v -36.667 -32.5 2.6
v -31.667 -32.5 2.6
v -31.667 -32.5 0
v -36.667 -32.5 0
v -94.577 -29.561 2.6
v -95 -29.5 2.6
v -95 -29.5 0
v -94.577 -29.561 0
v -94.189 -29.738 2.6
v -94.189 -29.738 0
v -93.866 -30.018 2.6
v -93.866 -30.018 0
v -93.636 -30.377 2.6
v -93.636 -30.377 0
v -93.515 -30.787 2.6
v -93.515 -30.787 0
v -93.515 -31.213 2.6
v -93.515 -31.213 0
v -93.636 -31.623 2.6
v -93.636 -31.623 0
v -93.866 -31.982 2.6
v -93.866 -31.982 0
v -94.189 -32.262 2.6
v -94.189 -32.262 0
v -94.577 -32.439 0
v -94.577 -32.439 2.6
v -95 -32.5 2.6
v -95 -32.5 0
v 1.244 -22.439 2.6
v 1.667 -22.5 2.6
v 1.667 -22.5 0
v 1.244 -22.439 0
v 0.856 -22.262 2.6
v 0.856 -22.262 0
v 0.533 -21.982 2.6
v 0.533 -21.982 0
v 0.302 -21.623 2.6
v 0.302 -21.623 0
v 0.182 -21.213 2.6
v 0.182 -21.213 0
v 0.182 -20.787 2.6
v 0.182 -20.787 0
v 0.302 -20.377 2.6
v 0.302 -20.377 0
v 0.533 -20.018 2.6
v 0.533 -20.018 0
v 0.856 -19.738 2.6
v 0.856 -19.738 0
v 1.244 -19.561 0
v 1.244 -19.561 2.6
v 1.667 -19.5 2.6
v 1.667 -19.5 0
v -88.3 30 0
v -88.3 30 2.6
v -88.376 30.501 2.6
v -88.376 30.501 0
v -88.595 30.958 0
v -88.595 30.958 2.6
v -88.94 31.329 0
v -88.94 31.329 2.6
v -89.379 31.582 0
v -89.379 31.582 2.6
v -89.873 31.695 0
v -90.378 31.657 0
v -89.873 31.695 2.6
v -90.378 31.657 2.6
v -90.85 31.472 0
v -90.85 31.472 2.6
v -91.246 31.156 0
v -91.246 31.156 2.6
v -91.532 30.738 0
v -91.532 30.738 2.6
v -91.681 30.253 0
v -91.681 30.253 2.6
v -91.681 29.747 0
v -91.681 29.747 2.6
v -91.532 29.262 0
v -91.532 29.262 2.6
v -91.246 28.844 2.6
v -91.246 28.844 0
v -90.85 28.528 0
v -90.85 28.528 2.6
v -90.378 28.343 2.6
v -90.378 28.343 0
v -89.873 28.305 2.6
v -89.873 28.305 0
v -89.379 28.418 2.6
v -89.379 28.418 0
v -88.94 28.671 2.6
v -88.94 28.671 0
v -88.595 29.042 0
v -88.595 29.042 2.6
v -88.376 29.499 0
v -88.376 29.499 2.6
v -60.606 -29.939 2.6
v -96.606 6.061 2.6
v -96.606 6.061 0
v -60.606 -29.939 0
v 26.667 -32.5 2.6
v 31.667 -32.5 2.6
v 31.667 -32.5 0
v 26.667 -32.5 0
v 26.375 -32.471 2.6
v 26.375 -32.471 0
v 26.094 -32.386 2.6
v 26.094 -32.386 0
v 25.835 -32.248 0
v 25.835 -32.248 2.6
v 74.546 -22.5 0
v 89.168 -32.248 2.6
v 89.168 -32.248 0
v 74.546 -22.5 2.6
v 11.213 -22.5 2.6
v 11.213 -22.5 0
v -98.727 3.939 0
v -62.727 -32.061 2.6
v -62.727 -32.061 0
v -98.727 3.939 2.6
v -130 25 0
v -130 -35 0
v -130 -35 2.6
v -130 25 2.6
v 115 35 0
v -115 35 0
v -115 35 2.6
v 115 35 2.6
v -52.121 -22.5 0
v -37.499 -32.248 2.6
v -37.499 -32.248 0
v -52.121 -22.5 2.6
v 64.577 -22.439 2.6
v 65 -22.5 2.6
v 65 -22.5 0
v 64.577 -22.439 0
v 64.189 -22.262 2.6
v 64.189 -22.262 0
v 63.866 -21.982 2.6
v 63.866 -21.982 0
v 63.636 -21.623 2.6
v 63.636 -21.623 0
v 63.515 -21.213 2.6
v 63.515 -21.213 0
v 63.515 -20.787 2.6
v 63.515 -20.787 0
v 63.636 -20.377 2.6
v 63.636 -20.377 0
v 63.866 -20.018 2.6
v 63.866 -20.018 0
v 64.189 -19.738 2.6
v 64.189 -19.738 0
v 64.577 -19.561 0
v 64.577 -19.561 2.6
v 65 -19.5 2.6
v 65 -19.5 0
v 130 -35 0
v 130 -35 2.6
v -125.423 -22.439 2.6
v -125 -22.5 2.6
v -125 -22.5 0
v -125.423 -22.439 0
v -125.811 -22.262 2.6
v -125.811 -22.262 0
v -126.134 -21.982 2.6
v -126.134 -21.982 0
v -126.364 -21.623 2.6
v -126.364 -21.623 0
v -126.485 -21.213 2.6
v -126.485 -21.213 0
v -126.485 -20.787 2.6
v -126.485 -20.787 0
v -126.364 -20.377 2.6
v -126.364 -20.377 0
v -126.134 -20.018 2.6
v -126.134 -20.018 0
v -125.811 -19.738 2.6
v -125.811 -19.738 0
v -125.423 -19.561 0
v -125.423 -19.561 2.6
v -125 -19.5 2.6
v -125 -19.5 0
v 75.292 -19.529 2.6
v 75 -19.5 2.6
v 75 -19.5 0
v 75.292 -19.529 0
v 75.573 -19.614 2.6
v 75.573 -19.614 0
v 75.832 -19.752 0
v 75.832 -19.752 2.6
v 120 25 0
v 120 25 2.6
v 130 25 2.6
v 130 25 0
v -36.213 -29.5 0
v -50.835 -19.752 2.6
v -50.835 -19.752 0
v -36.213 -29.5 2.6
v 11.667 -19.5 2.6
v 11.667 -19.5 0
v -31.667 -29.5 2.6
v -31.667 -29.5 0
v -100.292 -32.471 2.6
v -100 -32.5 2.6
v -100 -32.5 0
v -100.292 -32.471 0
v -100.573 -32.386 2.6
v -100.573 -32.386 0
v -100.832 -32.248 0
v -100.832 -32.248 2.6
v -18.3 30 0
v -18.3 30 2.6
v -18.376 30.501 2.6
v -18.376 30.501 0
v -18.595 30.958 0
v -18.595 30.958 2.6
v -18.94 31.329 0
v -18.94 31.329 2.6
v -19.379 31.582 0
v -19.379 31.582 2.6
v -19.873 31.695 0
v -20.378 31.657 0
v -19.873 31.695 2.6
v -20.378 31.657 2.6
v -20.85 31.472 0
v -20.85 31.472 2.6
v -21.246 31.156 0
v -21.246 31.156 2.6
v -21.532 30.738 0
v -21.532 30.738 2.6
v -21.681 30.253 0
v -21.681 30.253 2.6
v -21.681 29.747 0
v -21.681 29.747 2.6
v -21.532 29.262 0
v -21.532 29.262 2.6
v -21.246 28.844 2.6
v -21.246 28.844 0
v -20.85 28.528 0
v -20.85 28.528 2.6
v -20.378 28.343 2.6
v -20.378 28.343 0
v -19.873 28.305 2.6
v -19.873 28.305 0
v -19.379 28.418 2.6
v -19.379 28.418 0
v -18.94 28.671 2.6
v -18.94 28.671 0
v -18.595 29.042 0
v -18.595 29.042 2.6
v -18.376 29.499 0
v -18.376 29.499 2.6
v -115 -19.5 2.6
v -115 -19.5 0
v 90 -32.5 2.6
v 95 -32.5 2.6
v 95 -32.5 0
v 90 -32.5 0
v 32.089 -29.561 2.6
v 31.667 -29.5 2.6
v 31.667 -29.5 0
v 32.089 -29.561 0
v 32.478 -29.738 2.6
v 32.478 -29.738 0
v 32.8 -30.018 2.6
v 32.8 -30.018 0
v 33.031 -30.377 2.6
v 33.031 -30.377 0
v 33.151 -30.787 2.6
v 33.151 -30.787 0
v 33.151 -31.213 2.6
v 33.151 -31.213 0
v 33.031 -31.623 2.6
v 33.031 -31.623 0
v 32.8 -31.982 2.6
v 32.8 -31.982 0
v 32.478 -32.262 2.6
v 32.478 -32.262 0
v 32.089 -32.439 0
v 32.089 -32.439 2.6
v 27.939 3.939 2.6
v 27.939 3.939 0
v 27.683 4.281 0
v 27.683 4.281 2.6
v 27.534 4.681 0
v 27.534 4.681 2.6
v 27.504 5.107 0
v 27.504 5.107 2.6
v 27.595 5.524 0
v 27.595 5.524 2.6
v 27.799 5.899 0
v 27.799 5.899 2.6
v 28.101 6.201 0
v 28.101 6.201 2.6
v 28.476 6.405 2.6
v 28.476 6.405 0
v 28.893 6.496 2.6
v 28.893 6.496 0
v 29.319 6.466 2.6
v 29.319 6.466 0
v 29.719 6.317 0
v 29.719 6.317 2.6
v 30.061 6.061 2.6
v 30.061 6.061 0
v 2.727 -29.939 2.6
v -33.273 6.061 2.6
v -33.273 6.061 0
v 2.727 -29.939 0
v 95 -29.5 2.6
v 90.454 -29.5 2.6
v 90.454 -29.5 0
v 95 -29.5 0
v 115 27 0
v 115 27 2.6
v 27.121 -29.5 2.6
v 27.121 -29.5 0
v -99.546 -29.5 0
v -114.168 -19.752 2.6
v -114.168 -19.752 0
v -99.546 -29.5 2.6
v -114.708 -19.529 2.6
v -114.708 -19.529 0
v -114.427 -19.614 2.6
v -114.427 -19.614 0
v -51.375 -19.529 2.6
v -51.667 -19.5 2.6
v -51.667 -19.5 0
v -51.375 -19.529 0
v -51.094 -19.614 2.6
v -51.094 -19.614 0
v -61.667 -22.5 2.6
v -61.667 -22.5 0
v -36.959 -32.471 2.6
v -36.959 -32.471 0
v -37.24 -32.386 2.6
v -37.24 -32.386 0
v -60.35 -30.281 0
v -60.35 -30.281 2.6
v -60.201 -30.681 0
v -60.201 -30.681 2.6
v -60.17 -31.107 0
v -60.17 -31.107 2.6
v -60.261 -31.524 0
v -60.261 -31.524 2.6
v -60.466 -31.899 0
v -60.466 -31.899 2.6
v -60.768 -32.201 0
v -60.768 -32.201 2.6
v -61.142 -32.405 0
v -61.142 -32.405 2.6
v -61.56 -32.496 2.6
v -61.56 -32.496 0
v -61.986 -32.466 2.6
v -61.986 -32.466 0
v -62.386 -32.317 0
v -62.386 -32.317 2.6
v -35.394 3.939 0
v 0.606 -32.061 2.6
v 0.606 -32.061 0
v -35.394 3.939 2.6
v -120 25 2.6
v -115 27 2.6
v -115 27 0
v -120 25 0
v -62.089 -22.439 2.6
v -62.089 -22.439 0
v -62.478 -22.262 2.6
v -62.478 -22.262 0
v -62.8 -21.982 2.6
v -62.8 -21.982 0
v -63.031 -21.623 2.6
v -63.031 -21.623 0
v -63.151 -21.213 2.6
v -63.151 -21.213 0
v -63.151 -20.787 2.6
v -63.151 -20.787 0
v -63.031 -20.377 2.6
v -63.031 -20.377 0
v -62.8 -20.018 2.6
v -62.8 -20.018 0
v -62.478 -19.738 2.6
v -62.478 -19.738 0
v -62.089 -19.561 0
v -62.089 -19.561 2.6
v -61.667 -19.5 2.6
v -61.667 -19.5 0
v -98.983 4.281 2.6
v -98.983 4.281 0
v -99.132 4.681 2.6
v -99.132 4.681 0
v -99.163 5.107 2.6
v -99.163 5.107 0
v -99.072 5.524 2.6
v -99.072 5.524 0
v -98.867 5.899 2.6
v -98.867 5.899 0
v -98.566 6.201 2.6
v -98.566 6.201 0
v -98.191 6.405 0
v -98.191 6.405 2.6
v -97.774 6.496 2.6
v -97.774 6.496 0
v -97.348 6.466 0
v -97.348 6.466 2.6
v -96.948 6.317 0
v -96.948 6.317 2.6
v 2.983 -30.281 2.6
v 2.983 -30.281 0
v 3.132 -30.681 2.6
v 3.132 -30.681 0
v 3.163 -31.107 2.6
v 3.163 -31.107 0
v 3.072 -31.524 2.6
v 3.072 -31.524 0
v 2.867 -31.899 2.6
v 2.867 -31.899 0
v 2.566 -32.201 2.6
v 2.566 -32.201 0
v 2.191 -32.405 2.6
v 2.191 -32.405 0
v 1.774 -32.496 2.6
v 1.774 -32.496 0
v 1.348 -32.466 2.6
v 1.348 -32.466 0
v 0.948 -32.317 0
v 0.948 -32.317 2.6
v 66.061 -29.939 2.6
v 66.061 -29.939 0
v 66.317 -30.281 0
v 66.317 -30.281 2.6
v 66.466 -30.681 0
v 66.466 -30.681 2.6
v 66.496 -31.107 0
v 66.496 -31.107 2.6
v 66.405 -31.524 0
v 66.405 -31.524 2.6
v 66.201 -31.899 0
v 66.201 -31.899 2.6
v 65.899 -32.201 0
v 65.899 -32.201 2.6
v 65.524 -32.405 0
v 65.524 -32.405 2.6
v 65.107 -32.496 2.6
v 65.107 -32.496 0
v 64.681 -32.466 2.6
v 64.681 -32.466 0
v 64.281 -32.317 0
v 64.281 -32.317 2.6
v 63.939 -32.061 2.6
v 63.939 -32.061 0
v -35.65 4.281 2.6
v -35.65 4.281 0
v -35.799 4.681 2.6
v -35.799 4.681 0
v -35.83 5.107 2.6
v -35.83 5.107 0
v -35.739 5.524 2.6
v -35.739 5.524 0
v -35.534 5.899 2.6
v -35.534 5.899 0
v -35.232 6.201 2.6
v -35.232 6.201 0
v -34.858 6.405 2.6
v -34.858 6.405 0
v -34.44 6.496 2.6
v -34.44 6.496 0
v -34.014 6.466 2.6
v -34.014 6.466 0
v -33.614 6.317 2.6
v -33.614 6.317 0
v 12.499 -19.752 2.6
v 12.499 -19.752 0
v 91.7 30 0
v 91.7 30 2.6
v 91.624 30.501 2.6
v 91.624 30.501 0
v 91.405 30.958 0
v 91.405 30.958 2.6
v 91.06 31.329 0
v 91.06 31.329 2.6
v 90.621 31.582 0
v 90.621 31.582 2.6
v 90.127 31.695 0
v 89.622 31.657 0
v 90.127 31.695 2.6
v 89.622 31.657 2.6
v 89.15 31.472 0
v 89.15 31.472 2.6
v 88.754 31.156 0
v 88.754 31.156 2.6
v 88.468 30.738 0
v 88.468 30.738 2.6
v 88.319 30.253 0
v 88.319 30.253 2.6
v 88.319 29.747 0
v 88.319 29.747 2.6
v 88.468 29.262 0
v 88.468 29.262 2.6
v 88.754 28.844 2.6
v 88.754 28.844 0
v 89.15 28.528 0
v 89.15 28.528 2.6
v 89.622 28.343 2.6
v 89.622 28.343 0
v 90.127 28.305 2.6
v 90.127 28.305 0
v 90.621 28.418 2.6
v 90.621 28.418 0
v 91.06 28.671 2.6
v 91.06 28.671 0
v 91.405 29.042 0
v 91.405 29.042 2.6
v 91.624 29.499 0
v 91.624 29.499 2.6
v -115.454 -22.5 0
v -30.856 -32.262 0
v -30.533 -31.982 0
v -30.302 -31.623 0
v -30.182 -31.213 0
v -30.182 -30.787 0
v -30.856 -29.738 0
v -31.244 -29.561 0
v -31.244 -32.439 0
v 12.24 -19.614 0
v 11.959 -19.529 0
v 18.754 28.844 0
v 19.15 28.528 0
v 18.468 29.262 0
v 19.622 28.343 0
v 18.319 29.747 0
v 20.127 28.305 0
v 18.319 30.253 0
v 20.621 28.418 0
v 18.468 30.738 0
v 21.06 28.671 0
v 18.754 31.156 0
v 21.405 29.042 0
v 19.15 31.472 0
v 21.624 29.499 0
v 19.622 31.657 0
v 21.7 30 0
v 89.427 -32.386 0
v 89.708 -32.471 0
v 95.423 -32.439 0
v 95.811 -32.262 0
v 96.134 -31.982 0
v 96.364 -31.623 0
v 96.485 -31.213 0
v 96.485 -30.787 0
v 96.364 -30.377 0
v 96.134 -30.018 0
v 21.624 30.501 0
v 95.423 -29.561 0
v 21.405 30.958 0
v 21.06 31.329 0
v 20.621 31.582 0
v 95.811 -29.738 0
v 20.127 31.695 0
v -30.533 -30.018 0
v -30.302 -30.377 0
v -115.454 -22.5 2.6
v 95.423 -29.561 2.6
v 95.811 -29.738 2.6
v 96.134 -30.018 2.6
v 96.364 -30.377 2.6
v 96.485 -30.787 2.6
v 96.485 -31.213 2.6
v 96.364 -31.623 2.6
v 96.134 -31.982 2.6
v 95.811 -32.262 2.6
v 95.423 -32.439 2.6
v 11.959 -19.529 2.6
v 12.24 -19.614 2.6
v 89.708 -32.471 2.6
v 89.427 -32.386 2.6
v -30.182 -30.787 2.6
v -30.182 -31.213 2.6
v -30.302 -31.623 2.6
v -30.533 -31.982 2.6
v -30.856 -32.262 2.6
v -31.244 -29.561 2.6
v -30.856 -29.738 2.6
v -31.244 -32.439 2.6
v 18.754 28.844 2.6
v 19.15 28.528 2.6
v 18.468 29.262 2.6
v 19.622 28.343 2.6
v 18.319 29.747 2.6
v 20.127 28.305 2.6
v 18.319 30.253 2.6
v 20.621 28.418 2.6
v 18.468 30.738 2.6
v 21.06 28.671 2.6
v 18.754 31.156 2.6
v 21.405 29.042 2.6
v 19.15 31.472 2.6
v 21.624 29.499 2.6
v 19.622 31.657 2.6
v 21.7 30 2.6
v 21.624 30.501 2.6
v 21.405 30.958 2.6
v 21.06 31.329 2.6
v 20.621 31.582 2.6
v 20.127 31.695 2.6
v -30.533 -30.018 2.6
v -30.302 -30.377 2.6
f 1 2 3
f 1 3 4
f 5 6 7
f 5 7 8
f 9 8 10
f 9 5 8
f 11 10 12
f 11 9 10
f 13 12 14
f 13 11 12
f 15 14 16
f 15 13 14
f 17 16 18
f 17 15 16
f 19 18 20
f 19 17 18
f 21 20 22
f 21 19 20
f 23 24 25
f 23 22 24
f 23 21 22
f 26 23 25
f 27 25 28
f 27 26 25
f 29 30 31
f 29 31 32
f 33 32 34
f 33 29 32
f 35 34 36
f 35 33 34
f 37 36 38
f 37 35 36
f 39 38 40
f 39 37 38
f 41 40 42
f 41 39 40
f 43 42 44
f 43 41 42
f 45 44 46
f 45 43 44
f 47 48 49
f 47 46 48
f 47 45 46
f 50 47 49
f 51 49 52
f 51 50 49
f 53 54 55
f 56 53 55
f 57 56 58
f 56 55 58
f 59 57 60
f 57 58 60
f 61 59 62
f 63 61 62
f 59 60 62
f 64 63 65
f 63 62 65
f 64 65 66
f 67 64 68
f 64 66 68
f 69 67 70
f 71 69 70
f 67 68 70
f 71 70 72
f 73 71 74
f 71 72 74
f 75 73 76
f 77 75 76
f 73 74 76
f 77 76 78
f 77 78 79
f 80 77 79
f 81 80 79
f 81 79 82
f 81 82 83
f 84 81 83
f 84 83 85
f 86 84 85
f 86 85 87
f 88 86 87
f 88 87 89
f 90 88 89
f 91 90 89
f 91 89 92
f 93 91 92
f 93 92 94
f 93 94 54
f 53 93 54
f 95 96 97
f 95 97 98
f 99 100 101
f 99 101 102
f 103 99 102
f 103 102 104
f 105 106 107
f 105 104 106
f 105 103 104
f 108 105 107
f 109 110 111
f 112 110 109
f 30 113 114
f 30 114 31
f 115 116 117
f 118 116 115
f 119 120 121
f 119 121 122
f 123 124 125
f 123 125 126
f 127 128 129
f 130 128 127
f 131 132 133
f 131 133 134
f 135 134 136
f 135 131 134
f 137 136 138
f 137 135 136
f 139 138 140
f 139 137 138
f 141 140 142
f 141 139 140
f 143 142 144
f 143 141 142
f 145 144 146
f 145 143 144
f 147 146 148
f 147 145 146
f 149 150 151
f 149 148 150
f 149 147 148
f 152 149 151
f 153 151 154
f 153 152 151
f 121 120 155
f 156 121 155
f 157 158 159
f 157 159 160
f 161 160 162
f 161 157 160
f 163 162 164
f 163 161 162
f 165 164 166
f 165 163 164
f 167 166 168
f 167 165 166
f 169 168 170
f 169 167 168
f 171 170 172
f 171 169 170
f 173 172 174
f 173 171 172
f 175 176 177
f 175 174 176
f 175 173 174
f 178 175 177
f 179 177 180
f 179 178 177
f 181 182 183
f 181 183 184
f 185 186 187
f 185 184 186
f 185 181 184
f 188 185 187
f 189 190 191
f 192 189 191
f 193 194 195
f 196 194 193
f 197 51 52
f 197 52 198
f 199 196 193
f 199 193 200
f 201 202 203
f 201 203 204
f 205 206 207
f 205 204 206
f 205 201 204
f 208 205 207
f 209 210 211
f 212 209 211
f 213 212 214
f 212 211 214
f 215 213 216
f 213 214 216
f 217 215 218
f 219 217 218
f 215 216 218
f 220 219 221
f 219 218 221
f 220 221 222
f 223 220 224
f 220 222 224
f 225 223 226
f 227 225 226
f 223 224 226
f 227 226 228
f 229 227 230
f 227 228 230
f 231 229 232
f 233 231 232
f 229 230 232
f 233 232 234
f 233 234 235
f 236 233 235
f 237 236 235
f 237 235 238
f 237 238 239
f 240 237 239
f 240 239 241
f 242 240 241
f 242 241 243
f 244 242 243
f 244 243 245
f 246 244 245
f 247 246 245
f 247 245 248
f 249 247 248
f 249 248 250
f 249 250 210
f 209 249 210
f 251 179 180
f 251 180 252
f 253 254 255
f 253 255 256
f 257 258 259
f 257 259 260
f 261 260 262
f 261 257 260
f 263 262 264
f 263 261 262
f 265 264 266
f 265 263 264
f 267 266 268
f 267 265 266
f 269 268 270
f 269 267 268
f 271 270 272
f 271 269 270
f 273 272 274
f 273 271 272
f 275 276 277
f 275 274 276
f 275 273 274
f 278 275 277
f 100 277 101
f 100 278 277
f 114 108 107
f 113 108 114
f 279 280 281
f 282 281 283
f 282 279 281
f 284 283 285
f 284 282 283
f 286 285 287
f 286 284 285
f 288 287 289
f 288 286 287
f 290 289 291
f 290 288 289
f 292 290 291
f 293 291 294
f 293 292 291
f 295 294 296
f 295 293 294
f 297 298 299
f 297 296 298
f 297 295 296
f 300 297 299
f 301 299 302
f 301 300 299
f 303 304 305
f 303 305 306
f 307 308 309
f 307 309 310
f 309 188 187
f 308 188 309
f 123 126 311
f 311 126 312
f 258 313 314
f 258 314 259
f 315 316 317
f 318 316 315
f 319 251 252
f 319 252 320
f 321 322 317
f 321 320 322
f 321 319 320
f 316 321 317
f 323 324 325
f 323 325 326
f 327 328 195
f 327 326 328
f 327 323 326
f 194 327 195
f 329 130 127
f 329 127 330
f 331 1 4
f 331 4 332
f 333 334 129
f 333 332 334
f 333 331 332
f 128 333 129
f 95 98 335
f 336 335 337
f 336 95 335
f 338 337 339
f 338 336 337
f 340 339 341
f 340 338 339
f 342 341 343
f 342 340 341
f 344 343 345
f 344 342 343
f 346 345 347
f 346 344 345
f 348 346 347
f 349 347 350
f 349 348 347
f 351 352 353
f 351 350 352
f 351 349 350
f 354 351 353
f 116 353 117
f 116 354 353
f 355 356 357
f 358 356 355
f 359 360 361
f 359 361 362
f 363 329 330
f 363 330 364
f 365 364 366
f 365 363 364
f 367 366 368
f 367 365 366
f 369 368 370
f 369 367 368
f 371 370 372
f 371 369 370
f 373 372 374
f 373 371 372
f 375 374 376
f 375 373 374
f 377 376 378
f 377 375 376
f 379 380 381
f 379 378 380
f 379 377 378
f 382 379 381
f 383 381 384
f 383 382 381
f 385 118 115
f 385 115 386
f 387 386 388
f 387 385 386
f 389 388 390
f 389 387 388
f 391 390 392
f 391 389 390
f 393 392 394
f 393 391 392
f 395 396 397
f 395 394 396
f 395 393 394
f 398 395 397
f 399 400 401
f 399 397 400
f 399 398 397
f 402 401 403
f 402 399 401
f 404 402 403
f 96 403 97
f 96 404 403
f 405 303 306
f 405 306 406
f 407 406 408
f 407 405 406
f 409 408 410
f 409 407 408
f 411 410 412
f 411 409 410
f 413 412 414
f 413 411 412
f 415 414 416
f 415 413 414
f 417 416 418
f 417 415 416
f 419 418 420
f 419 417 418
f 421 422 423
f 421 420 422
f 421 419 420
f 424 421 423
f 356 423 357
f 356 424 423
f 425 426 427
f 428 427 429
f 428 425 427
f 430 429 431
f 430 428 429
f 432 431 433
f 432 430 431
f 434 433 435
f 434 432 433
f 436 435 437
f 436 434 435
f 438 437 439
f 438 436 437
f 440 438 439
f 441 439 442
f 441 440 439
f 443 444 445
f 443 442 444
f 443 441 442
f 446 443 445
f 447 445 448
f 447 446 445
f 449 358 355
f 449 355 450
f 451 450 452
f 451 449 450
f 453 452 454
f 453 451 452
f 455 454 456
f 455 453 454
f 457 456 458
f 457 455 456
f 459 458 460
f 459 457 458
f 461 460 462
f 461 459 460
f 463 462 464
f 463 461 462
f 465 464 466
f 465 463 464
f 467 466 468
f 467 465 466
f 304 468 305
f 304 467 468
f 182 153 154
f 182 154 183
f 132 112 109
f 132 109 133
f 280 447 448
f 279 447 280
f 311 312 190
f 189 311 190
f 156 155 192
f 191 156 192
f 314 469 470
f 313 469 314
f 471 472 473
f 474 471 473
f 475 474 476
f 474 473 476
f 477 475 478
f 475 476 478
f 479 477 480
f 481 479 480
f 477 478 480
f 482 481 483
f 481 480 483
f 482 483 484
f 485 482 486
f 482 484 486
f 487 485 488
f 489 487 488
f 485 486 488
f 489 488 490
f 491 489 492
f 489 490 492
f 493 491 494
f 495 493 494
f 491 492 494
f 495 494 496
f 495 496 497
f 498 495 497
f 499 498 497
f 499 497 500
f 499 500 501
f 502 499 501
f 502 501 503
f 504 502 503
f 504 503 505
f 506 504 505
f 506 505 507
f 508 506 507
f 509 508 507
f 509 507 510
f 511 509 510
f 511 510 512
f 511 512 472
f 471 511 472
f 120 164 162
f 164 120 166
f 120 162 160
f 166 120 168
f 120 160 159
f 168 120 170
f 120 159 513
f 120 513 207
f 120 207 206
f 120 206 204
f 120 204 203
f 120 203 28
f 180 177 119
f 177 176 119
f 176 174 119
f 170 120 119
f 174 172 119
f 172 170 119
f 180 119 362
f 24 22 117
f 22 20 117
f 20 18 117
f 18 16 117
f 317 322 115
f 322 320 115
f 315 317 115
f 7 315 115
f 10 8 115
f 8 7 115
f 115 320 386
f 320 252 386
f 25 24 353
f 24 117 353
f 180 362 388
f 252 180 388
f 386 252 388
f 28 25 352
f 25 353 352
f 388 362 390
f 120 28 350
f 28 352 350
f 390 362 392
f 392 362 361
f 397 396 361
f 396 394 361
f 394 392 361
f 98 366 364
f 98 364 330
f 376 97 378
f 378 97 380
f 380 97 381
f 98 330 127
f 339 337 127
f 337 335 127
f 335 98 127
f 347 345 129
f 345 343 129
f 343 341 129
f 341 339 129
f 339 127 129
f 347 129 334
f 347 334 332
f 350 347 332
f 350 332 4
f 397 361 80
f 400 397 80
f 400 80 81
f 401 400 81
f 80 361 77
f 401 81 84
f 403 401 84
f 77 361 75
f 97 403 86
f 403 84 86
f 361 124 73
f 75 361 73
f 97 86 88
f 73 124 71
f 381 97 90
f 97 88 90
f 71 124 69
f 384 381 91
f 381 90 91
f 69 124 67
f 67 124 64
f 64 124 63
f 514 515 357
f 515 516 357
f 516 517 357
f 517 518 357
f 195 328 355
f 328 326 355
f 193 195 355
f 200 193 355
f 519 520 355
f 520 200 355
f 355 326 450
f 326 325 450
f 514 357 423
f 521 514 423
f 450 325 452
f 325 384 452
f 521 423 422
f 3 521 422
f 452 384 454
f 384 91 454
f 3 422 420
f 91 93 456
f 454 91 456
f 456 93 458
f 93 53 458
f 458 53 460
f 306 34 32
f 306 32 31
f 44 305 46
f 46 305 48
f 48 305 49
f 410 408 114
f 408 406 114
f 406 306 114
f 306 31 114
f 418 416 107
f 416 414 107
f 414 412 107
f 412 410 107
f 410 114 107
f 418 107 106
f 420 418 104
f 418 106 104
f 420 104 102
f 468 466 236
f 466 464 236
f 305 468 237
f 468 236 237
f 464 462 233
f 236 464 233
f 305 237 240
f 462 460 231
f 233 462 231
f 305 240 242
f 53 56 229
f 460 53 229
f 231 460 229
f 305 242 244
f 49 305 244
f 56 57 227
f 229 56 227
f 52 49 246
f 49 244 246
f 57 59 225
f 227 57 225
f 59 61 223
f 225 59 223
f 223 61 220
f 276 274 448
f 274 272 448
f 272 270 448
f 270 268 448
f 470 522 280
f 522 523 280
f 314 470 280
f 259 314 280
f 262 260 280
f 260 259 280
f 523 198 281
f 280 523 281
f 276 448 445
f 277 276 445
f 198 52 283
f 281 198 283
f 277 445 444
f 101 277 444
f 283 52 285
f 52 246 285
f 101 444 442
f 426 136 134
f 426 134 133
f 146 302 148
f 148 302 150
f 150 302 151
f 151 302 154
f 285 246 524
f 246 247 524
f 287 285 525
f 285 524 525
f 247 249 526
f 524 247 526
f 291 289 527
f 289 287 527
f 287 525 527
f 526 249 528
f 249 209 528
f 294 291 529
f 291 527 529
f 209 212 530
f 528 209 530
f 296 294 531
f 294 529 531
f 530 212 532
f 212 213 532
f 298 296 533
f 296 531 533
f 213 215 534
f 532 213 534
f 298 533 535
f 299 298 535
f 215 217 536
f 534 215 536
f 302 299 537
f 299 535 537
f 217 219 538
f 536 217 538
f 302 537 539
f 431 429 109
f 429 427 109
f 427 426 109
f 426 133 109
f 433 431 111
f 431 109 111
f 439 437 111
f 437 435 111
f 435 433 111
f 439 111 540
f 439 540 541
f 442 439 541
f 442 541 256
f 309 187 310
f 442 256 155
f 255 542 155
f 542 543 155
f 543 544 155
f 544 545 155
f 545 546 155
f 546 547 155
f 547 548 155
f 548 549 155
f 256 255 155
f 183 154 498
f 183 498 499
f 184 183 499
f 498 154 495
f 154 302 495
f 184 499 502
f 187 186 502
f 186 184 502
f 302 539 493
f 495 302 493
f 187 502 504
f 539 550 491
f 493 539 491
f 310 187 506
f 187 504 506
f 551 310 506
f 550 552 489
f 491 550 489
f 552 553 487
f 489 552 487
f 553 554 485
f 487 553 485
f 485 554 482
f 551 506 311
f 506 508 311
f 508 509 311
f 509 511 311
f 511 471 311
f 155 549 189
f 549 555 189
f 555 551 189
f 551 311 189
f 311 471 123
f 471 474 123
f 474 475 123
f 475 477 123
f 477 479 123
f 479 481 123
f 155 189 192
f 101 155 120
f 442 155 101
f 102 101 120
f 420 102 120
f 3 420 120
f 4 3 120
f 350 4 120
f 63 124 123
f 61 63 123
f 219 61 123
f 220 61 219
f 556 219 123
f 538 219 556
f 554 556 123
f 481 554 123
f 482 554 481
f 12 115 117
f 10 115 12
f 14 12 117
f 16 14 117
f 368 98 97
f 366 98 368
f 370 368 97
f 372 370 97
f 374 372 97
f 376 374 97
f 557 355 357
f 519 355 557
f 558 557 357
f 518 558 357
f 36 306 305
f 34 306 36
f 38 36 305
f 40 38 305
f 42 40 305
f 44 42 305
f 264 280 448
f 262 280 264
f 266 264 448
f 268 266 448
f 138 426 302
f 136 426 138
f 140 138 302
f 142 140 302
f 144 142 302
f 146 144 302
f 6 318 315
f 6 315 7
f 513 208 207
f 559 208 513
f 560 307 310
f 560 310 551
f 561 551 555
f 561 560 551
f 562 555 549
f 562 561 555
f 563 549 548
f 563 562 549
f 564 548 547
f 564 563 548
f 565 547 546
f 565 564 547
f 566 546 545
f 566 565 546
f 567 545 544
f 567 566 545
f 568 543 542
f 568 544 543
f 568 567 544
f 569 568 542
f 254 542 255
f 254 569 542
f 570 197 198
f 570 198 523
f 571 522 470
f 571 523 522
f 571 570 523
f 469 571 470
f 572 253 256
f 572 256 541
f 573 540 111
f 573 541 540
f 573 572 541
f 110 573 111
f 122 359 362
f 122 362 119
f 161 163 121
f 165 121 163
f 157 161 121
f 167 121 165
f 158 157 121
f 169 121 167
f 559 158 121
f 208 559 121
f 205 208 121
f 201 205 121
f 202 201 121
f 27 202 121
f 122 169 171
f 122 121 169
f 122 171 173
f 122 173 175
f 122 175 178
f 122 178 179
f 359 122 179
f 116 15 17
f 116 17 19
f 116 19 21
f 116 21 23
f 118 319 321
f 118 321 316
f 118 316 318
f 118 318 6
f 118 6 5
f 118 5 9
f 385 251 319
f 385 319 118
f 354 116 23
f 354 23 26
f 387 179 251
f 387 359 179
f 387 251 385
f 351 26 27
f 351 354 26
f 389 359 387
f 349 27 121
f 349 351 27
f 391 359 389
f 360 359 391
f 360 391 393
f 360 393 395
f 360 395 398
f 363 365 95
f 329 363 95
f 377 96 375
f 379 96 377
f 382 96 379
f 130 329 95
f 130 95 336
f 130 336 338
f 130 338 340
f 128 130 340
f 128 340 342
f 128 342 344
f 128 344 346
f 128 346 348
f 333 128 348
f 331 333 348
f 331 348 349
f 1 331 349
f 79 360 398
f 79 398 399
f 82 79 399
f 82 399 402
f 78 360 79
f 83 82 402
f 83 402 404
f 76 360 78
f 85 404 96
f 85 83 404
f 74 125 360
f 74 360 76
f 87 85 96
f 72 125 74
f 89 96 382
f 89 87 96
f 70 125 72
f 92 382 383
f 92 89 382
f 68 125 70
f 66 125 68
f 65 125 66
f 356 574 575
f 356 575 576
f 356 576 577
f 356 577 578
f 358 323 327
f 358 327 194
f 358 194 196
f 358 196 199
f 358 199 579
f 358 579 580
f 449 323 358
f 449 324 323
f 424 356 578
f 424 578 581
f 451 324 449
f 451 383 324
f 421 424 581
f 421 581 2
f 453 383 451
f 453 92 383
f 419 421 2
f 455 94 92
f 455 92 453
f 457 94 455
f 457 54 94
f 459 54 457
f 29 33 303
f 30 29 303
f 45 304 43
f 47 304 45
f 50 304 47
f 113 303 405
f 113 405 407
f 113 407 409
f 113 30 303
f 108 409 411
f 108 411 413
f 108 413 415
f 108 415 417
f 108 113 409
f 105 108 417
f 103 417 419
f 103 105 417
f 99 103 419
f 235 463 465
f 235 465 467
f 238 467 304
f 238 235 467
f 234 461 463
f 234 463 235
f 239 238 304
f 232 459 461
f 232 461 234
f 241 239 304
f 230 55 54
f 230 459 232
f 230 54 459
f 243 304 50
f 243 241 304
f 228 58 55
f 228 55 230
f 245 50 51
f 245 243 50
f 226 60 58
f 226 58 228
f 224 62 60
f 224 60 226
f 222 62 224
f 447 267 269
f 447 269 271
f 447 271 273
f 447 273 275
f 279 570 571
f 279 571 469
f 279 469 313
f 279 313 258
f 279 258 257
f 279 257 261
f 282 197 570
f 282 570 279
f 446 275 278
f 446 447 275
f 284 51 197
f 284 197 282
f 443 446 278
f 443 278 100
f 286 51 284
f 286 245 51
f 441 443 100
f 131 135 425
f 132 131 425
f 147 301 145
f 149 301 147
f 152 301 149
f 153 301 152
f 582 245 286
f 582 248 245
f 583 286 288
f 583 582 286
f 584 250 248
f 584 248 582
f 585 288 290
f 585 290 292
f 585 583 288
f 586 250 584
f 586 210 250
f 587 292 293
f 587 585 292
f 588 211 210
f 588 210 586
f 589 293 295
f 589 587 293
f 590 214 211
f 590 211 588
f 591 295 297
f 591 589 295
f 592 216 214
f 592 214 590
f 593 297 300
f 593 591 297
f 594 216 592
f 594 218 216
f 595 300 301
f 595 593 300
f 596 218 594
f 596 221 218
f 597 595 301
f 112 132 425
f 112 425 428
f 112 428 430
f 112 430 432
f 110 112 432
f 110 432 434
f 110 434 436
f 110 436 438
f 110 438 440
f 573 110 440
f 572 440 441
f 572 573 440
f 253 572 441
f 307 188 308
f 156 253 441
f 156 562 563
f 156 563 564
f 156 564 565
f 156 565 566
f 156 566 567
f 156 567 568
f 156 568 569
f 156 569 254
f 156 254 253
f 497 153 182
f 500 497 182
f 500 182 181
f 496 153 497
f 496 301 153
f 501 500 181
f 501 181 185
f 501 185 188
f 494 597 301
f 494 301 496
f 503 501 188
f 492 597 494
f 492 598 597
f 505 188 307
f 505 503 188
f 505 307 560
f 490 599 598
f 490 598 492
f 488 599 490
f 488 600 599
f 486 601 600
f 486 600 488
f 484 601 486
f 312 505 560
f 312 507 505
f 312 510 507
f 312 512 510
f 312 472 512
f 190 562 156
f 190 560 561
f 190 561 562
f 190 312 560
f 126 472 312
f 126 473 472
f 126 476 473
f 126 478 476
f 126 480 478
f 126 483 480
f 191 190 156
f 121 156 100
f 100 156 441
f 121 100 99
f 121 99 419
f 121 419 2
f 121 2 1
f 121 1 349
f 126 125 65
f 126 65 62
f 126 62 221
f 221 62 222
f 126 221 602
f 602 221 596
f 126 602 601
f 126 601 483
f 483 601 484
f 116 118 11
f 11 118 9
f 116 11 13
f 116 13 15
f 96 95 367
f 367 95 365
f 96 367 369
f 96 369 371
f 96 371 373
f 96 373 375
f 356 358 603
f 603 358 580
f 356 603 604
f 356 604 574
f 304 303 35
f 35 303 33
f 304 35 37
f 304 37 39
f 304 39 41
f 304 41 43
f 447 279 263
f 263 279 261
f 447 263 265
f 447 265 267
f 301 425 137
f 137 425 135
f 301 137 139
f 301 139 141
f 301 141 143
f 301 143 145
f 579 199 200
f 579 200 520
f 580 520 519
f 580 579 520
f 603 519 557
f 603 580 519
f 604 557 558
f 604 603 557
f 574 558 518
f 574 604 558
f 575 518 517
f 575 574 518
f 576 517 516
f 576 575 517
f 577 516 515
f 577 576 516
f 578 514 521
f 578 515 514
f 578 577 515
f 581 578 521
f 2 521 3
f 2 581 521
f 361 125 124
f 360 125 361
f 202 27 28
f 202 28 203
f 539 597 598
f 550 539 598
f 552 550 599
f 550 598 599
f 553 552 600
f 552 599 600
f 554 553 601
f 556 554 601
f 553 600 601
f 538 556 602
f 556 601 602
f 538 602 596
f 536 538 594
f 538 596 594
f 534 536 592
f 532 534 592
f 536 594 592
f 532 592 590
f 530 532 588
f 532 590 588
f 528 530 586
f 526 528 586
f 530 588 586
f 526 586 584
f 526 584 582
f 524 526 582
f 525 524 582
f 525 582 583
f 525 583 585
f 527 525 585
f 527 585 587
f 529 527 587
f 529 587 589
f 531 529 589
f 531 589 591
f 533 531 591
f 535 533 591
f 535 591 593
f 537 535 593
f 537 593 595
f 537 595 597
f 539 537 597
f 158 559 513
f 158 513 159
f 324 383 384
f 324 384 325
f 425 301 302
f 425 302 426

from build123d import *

# Parameters (mm, degrees)
SKETCH_1_W             = 260
SKETCH_1_H             = 70
EXTRUDE_1_DEPTH        = 2.6
SKETCH_2_R             = 1.7
CUT_EXTRUDE_1_DEPTH    = 135.654223848
SKETCH_3_R             = 1.3
CUT_EXTRUDE_2_DEPTH    = 135.654223848
CUT_EXTRUDE_4_DEPTH    = 135.654223848
PATTERN_LINEAR_2_COUNT = 3
PATTERN_LINEAR_2_PITCH = 63.333333333
CUT_EXTRUDE_3_DEPTH    = 135.654223848
PATTERN_LINEAR_1_COUNT = 4
PATTERN_LINEAR_1_PITCH = 63.333333333


with BuildPart() as part:
    # 草图1 → 凸台-拉伸1 (new body)
    with BuildSketch(Plane.XY):
        Rectangle(SKETCH_1_W, SKETCH_1_H)
    extrude(amount=EXTRUDE_1_DEPTH)

    # 草图2 → 切除-拉伸1 (cut, through all)
    with BuildSketch(Plane.XY.offset(2.6)):
        with Locations((-90, 30)):
            Circle(SKETCH_2_R)
        with Locations((-20, 30)):
            Circle(SKETCH_2_R)
        with Locations((20, 30)):
            Circle(SKETCH_2_R)
        with Locations((90, 30)):
            Circle(SKETCH_2_R)
        Polygon((-130, 25), (-130, 35), (-115, 35), (-115, 27), (-120, 25), align=None)
        Polygon((130, 25), (130, 35), (115, 35), (115, 27), (120, 25), align=None)
    extrude(amount=-CUT_EXTRUDE_1_DEPTH, mode=Mode.SUBTRACT)

    # 草图3 → 切除-拉伸2 (cut, through all)
    with BuildSketch(Plane.XY.offset(2.6)):
        with Locations((-61.666666667, -31)):
            Circle(SKETCH_3_R)
        with Locations((1.666666667, -31)):
            Circle(SKETCH_3_R)
        with Locations((65, -31)):
            Circle(SKETCH_3_R)
    extrude(amount=-CUT_EXTRUDE_2_DEPTH, mode=Mode.SUBTRACT)

    # 草图5 → 切除-拉伸4 (cut, through all)
    with BuildSketch(Plane.XY.offset(2.6)):
        with BuildLine():
            Line((-62.727326838, -32.060660172), (-98.727326838, 3.939339828))
            ThreePointArc((-98.727326838, 3.939339828), (-98.727326838, 6.060660172), (-96.606006495, 6.060660172))
            Line((-96.606006495, 6.060660172), (-60.606006495, -29.939339828))
            ThreePointArc((-60.606006495, -29.939339828), (-60.606006495, -32.060660172), (-62.727326838, -32.060660172))
        make_face()
    cut_extrude_4 = extrude(amount=-CUT_EXTRUDE_4_DEPTH, mode=Mode.SUBTRACT)

    # 阵列(线性)2: 切除-拉伸4 ×3
    with Locations(*[(i * PATTERN_LINEAR_2_PITCH, 0, 0) for i in range(1, PATTERN_LINEAR_2_COUNT)]):
        add(cut_extrude_4, mode=Mode.SUBTRACT)

    # 草图4 → 切除-拉伸3 (cut, through all)
    with BuildSketch(Plane.XY.offset(2.6)):
        with BuildLine():
            Line((-125, -19.5), (-115, -19.5))
            ThreePointArc((-115, -19.5), (-114.565323777, -19.56436196), (-114.167949706, -19.751924558))
            Line((-114.167949706, -19.751924558), (-99.545836543, -29.5))
            Line((-99.545836543, -29.5), (-95, -29.5))
            ThreePointArc((-95, -29.5), (-93.5, -31), (-95, -32.5))
            Line((-95, -32.5), (-100, -32.5))
            ThreePointArc((-100, -32.5), (-100.434676223, -32.43563804), (-100.832050294, -32.248075442))
            Line((-100.832050294, -32.248075442), (-115.454163457, -22.5))
            Line((-115.454163457, -22.5), (-125, -22.5))
            ThreePointArc((-125, -22.5), (-126.5, -21), (-125, -19.5))
        make_face()
    cut_extrude_3 = extrude(amount=-CUT_EXTRUDE_3_DEPTH, mode=Mode.SUBTRACT)

    # 阵列(线性)1: 切除-拉伸3 ×4
    with Locations(*[(i * PATTERN_LINEAR_1_PITCH, 0, 0) for i in range(1, PATTERN_LINEAR_1_COUNT)]):
        add(cut_extrude_3, mode=Mode.SUBTRACT)


solid = part.part
